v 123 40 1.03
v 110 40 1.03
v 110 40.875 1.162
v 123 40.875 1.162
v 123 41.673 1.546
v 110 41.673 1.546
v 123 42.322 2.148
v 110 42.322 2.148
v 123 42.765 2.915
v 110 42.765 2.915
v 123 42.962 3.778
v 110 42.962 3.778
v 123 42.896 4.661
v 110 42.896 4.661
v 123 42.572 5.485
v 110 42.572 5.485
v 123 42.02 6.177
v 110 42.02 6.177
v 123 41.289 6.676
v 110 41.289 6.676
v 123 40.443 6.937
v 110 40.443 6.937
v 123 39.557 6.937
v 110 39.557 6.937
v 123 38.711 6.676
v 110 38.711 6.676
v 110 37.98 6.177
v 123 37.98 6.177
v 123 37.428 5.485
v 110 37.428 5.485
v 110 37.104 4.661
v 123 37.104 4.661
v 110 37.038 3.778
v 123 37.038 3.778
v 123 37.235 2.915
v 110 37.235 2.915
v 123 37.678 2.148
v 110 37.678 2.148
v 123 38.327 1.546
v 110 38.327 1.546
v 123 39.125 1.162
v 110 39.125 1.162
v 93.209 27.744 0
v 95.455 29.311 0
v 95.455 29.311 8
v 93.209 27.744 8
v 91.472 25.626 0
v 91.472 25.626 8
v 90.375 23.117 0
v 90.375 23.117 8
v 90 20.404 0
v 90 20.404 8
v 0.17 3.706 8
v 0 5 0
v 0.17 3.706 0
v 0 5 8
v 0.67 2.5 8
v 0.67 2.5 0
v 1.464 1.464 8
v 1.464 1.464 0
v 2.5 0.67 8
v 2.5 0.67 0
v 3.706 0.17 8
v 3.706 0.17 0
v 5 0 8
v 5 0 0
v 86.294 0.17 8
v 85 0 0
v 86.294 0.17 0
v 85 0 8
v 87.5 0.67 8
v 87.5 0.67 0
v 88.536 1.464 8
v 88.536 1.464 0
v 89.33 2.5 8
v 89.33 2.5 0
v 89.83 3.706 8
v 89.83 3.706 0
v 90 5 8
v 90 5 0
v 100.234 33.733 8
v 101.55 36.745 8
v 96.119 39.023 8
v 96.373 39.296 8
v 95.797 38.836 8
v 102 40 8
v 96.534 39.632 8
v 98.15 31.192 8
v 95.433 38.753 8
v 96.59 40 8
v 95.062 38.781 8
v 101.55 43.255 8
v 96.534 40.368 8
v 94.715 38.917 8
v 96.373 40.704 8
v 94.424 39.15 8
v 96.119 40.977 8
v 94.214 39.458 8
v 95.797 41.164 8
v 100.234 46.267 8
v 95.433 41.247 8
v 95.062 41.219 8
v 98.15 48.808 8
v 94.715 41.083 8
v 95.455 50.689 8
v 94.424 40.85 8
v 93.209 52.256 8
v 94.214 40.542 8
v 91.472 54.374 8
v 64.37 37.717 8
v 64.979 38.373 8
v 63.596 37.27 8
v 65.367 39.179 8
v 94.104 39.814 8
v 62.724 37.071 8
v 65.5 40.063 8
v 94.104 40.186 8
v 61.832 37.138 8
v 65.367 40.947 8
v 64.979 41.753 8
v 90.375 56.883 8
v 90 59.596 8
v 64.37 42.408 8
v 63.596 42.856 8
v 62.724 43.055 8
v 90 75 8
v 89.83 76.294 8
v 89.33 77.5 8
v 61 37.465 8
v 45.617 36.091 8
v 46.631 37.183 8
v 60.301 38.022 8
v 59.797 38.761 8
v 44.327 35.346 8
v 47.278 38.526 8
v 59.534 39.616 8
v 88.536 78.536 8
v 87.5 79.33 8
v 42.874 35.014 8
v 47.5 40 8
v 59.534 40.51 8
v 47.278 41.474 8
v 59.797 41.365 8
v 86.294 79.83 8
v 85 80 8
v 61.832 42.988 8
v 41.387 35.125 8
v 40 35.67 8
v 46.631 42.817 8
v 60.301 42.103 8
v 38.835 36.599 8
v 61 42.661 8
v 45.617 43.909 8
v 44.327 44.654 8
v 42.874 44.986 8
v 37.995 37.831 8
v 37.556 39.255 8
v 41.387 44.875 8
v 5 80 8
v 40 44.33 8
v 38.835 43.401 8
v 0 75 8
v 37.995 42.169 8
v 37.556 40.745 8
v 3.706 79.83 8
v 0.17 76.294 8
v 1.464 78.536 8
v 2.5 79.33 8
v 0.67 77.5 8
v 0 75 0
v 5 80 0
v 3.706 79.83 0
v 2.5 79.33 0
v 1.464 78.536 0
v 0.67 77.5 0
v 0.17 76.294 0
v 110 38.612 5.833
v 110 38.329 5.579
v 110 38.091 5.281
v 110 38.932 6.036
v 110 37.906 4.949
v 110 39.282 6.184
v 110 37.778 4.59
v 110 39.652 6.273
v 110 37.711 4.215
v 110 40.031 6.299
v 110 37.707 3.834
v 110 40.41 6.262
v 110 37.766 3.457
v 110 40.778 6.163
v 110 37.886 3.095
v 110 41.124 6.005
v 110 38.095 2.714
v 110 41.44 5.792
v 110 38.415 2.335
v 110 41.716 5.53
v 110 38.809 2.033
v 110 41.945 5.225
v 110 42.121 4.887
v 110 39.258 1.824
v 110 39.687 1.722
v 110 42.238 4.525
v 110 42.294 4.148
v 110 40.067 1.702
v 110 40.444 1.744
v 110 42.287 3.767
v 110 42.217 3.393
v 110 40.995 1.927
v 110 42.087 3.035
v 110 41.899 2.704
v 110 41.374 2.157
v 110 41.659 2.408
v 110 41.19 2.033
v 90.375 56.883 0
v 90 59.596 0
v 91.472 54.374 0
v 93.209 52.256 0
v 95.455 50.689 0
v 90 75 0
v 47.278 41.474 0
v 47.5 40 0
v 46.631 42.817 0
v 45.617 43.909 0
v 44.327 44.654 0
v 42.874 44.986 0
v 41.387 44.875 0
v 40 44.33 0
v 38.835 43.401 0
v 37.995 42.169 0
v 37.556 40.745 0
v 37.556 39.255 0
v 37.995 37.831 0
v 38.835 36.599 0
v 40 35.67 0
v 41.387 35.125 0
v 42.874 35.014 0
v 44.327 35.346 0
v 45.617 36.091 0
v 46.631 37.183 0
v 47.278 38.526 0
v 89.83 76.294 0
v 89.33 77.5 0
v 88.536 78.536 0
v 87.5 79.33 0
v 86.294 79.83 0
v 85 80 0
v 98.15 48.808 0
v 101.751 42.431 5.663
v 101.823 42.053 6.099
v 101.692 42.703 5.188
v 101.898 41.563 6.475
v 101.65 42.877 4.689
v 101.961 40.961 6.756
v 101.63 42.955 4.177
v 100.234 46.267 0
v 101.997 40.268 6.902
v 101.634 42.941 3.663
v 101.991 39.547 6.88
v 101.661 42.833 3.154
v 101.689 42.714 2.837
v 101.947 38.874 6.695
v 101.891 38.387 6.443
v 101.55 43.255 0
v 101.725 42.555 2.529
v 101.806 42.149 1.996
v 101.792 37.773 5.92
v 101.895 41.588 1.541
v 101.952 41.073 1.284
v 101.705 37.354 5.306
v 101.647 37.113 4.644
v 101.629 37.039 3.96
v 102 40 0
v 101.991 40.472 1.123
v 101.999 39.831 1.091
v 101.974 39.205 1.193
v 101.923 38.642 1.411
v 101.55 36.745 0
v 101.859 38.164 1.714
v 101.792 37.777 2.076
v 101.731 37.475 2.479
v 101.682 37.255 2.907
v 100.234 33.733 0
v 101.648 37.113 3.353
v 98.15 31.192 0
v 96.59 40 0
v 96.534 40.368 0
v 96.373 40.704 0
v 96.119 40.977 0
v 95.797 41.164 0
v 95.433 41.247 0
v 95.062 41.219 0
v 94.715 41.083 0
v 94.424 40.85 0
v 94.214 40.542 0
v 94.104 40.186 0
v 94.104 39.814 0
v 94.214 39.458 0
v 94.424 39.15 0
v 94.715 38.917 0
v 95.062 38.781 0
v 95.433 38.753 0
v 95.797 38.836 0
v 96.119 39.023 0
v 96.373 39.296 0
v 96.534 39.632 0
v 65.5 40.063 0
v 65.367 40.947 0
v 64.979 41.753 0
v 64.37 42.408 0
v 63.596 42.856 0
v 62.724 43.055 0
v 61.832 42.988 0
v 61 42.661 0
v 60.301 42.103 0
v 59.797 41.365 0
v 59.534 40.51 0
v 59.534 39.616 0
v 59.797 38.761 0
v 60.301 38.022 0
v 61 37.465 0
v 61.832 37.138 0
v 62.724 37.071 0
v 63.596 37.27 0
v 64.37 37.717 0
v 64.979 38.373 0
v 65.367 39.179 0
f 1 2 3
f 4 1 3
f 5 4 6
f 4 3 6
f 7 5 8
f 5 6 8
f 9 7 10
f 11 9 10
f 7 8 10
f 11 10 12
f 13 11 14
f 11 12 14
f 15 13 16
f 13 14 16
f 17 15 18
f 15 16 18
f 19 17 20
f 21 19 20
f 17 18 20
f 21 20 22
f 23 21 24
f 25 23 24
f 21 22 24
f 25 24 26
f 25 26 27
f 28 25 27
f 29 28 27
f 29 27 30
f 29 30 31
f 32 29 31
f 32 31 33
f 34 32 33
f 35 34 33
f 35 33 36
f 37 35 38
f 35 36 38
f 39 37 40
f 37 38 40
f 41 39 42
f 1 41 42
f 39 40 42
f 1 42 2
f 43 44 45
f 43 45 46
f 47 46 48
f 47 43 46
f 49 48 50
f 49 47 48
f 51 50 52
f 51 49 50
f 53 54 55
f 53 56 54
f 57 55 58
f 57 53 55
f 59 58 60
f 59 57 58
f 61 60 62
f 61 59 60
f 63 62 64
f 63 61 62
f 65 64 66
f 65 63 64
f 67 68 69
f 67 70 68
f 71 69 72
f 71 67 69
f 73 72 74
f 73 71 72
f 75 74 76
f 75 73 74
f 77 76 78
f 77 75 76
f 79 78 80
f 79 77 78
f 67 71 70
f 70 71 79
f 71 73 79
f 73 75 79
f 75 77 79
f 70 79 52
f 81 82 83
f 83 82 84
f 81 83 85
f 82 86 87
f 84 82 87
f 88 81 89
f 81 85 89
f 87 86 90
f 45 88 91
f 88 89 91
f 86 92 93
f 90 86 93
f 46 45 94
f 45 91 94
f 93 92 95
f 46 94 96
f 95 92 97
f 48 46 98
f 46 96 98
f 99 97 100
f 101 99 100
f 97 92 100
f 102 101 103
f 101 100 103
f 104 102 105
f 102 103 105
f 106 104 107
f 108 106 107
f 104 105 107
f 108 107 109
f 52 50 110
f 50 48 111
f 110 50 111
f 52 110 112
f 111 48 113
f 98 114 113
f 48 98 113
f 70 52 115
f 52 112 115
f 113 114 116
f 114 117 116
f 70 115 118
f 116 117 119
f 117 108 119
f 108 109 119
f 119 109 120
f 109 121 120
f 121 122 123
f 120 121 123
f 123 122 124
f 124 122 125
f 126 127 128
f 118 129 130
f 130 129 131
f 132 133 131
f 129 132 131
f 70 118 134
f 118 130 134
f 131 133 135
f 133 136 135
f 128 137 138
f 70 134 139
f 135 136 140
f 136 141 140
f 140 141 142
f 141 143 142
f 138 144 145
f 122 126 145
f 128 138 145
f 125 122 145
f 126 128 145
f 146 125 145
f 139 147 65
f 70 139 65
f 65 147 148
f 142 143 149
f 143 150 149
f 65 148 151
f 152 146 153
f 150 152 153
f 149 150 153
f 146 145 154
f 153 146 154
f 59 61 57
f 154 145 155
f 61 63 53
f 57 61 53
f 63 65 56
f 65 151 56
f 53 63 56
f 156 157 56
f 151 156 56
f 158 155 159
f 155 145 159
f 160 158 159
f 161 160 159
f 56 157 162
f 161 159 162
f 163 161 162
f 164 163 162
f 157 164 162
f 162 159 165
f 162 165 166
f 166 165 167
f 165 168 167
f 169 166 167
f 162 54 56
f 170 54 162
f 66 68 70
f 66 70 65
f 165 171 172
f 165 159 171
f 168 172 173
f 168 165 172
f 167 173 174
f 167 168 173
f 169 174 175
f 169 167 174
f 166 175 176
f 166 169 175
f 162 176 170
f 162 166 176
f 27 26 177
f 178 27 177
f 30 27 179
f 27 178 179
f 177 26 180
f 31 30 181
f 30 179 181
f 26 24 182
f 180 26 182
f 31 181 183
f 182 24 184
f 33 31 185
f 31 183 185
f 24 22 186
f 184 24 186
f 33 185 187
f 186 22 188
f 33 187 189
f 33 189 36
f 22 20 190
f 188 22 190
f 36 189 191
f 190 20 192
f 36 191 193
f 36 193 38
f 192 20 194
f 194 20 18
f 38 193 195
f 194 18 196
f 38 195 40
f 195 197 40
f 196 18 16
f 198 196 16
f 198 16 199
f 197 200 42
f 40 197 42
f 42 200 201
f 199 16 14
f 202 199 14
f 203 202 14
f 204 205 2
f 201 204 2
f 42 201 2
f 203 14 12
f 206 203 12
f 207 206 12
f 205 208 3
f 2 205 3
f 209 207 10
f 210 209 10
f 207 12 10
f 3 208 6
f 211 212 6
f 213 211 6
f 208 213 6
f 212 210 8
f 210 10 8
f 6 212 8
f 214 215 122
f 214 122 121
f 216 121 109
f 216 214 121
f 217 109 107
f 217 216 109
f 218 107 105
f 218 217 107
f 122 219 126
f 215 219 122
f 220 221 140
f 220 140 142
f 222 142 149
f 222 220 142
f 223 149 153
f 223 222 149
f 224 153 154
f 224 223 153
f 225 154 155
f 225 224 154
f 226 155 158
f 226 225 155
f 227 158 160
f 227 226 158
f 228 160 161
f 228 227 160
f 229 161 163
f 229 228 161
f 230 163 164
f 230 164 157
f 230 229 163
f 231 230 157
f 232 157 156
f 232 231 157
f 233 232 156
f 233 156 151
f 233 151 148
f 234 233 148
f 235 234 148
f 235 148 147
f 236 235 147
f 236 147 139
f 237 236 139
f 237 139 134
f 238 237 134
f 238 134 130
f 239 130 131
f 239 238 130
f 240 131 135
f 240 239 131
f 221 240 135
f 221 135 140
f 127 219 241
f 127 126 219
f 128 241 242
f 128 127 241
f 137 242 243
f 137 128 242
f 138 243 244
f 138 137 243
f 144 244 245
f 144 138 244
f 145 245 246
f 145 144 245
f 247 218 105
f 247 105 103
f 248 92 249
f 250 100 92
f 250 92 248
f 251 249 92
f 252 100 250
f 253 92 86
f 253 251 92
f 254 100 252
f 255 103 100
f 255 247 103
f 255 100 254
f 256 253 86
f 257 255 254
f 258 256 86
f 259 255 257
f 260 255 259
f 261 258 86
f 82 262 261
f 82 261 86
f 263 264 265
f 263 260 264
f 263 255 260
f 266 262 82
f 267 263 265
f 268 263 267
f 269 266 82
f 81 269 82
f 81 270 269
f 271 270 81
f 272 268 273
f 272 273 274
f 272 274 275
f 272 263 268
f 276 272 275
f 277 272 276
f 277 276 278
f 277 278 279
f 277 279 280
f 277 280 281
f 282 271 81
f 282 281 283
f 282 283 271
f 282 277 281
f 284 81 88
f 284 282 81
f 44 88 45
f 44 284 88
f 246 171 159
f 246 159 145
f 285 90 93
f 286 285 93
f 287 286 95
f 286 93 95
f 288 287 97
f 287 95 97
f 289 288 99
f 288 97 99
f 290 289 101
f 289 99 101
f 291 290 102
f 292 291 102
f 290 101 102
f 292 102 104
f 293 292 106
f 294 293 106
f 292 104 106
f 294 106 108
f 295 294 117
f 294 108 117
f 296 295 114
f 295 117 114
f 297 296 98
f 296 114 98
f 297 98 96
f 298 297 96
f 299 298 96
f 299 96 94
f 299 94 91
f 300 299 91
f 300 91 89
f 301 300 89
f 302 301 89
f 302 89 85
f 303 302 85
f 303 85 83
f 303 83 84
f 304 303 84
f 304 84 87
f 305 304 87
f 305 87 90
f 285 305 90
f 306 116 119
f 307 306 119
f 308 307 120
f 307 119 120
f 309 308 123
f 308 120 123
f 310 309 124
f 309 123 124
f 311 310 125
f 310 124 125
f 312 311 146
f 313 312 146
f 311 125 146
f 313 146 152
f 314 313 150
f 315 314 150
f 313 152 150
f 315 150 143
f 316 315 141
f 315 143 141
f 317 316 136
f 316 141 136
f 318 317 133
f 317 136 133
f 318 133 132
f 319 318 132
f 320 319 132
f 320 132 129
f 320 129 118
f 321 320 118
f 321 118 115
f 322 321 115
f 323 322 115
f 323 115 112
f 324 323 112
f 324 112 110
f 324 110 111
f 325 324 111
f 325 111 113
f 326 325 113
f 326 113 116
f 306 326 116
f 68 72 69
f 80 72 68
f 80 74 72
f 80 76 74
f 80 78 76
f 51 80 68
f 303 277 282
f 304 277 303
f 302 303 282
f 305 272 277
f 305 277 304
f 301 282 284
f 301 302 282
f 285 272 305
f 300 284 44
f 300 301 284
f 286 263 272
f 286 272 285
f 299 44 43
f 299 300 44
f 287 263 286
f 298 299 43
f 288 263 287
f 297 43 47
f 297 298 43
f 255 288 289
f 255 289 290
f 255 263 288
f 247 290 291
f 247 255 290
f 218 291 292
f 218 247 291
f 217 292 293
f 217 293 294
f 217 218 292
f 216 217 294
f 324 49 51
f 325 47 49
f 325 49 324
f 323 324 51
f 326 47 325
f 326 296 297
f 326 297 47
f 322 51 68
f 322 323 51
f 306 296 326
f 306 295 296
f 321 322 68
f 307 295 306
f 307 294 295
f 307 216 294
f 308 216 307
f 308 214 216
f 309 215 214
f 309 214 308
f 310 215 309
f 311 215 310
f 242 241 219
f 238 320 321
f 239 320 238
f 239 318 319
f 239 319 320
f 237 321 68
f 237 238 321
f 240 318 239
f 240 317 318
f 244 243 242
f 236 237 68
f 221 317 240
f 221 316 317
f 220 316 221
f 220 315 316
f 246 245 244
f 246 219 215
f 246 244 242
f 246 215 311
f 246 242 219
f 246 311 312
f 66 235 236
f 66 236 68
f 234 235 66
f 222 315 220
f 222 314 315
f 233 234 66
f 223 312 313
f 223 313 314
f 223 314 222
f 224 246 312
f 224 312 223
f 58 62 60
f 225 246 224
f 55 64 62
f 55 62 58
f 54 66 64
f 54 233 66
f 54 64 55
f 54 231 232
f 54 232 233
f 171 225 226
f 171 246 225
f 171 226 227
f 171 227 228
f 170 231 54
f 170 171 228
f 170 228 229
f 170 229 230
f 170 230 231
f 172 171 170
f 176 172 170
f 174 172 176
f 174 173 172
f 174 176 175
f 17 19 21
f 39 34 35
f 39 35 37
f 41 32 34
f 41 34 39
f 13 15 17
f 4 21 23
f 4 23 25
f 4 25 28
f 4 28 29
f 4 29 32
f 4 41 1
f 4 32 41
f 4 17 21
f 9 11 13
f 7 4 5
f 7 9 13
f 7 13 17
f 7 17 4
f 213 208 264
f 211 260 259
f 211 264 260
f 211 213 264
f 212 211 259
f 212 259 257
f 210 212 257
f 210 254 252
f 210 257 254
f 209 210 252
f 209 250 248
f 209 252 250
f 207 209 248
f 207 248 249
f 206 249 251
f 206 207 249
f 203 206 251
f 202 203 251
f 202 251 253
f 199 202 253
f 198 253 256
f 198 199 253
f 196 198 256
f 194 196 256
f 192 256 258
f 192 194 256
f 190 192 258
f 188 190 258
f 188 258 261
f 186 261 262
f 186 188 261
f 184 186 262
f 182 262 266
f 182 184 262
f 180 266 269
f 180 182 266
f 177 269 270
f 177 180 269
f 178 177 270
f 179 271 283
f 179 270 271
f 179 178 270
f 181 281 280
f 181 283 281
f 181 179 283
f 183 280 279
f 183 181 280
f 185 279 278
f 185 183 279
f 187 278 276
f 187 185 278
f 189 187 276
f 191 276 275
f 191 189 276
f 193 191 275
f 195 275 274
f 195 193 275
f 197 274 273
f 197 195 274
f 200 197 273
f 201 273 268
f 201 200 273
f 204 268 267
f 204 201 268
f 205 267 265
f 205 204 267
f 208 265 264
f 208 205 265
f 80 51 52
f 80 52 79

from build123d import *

# Parameters (mm, degrees)
SKETCH1_R                = 5
BOSS_EXTRUDE1_DEPTH      = 8
BOSS_EXTRUDE2_DEPTH      = 10
BOSS_EXTRUDE2_DEPTH_BACK = 3
SKETCH4_R                = 2.970033329
FILLET6_R                = 5
SKETCH5_R                = 1.25
CUT_EXTRUDE2_DEPTH       = 10
SKETCH6_R                = 3
CUT_EXTRUDE3_DEPTH       = 10


with BuildPart() as part:
    # Sketch1 → Boss-Extrude1 (new body)
    with BuildSketch(Plane.XY):
        with BuildLine():
            Line((0, 25.404082058), (0, 80))
            Line((0, 80), (90, 80))
            Line((90, 80), (90, 59.595917942))
            ThreePointArc((90, 59.595917942), (91.471971346, 54.373588264), (95.454545455, 50.688682514))
            ThreePointArc((95.454545455, 50.688682514), (102, 40), (95.454545455, 29.311317486))
            ThreePointArc((95.454545455, 29.311317486), (91.471971346, 25.626411736), (90, 20.404082058))
            Line((90, 20.404082058), (90, 0))
            Line((90, 0), (0, 0))
            Line((0, 0), (0, 25.404082058))
        make_face()
        with Locations((42.5, 40)):
            Circle(SKETCH1_R, mode=Mode.SUBTRACT)
    extrude(amount=BOSS_EXTRUDE1_DEPTH)

    # Loft1: read off the stored shape, not the designer's step
    # Loft1: loft between two sections, ruled curve by curve
    loft1_from = [
        Edge.make_bspline([(98, 43.257575322, 2.799379564), (98, 45.658816193, 9.314530208), (98, 39.143665549, 11.715771079), (98, 36.742424678, 5.200620436), (98, 34.341183807, -1.314530208), (98, 40.856334451, -3.715771079), (98, 43.257575322, 2.799379564)], [0, 0, 0, 0, 0.5, 0.5, 0.5, 1, 1, 1, 1], 3, [1, 0.333333333, 0.333333333, 1, 0.333333333, 0.333333333, 1]),
    ]
    loft1_to = [
        Edge.make_bspline([(113, 40.429483248, 1.709498759), (113, 45.010485729, 2.568465255), (113, 44.151519233, 7.149467737), (113, 39.570516752, 6.290501241), (113, 34.989514271, 5.431534745), (113, 35.848480767, 0.850532263), (113, 40.429483248, 1.709498759)], [0, 0, 0, 0, 0.5, 0.5, 0.5, 1, 1, 1, 1], 3, [1, 0.333333333, 0.333333333, 1, 0.333333333, 0.333333333, 1]),
    ]
    loft1 = Solid(Shell([*[Face.make_surface_from_curves(loft1_from[k], loft1_to[k]) for k in range(1)], Face(Wire(loft1_from)), Face(Wire(loft1_to))]))
    add(loft1)

    # Sketch4 → Boss-Extrude2 (add, two sides: drawn at the far end of the back side and taken through both)
    with BuildSketch(Plane(origin=(113, 0, 0), x_dir=(0, 0, -1), z_dir=(1, 0, 0)).offset(-BOSS_EXTRUDE2_DEPTH_BACK)):
        with Locations((-4, 40)):
            Circle(SKETCH4_R)
    extrude(amount=BOSS_EXTRUDE2_DEPTH + BOSS_EXTRUDE2_DEPTH_BACK)

    # Fillet6
    fillet6_edges = [part.edges().sort_by_distance(p)[0] for p in [
        (0, 80, 4),
        (90, 80, 4),
        (90, 0, 4),
        (0, 0, 4),
    ]]
    fillet(fillet6_edges, radius=FILLET6_R)

    # Sketch5 → Cut-Extrude2 (cut)
    with BuildSketch(Plane.XY.offset(8)):
        with Locations((95.34, 40)):
            Circle(SKETCH5_R)
    extrude(amount=-CUT_EXTRUDE2_DEPTH, mode=Mode.SUBTRACT)

    # Sketch6 → Cut-Extrude3 (cut)
    with BuildSketch(Plane.XY.offset(8)):
        with Locations((62.5, 40.062959469)):
            Circle(SKETCH6_R)
    extrude(amount=-CUT_EXTRUDE3_DEPTH, mode=Mode.SUBTRACT)


solid = part.part
